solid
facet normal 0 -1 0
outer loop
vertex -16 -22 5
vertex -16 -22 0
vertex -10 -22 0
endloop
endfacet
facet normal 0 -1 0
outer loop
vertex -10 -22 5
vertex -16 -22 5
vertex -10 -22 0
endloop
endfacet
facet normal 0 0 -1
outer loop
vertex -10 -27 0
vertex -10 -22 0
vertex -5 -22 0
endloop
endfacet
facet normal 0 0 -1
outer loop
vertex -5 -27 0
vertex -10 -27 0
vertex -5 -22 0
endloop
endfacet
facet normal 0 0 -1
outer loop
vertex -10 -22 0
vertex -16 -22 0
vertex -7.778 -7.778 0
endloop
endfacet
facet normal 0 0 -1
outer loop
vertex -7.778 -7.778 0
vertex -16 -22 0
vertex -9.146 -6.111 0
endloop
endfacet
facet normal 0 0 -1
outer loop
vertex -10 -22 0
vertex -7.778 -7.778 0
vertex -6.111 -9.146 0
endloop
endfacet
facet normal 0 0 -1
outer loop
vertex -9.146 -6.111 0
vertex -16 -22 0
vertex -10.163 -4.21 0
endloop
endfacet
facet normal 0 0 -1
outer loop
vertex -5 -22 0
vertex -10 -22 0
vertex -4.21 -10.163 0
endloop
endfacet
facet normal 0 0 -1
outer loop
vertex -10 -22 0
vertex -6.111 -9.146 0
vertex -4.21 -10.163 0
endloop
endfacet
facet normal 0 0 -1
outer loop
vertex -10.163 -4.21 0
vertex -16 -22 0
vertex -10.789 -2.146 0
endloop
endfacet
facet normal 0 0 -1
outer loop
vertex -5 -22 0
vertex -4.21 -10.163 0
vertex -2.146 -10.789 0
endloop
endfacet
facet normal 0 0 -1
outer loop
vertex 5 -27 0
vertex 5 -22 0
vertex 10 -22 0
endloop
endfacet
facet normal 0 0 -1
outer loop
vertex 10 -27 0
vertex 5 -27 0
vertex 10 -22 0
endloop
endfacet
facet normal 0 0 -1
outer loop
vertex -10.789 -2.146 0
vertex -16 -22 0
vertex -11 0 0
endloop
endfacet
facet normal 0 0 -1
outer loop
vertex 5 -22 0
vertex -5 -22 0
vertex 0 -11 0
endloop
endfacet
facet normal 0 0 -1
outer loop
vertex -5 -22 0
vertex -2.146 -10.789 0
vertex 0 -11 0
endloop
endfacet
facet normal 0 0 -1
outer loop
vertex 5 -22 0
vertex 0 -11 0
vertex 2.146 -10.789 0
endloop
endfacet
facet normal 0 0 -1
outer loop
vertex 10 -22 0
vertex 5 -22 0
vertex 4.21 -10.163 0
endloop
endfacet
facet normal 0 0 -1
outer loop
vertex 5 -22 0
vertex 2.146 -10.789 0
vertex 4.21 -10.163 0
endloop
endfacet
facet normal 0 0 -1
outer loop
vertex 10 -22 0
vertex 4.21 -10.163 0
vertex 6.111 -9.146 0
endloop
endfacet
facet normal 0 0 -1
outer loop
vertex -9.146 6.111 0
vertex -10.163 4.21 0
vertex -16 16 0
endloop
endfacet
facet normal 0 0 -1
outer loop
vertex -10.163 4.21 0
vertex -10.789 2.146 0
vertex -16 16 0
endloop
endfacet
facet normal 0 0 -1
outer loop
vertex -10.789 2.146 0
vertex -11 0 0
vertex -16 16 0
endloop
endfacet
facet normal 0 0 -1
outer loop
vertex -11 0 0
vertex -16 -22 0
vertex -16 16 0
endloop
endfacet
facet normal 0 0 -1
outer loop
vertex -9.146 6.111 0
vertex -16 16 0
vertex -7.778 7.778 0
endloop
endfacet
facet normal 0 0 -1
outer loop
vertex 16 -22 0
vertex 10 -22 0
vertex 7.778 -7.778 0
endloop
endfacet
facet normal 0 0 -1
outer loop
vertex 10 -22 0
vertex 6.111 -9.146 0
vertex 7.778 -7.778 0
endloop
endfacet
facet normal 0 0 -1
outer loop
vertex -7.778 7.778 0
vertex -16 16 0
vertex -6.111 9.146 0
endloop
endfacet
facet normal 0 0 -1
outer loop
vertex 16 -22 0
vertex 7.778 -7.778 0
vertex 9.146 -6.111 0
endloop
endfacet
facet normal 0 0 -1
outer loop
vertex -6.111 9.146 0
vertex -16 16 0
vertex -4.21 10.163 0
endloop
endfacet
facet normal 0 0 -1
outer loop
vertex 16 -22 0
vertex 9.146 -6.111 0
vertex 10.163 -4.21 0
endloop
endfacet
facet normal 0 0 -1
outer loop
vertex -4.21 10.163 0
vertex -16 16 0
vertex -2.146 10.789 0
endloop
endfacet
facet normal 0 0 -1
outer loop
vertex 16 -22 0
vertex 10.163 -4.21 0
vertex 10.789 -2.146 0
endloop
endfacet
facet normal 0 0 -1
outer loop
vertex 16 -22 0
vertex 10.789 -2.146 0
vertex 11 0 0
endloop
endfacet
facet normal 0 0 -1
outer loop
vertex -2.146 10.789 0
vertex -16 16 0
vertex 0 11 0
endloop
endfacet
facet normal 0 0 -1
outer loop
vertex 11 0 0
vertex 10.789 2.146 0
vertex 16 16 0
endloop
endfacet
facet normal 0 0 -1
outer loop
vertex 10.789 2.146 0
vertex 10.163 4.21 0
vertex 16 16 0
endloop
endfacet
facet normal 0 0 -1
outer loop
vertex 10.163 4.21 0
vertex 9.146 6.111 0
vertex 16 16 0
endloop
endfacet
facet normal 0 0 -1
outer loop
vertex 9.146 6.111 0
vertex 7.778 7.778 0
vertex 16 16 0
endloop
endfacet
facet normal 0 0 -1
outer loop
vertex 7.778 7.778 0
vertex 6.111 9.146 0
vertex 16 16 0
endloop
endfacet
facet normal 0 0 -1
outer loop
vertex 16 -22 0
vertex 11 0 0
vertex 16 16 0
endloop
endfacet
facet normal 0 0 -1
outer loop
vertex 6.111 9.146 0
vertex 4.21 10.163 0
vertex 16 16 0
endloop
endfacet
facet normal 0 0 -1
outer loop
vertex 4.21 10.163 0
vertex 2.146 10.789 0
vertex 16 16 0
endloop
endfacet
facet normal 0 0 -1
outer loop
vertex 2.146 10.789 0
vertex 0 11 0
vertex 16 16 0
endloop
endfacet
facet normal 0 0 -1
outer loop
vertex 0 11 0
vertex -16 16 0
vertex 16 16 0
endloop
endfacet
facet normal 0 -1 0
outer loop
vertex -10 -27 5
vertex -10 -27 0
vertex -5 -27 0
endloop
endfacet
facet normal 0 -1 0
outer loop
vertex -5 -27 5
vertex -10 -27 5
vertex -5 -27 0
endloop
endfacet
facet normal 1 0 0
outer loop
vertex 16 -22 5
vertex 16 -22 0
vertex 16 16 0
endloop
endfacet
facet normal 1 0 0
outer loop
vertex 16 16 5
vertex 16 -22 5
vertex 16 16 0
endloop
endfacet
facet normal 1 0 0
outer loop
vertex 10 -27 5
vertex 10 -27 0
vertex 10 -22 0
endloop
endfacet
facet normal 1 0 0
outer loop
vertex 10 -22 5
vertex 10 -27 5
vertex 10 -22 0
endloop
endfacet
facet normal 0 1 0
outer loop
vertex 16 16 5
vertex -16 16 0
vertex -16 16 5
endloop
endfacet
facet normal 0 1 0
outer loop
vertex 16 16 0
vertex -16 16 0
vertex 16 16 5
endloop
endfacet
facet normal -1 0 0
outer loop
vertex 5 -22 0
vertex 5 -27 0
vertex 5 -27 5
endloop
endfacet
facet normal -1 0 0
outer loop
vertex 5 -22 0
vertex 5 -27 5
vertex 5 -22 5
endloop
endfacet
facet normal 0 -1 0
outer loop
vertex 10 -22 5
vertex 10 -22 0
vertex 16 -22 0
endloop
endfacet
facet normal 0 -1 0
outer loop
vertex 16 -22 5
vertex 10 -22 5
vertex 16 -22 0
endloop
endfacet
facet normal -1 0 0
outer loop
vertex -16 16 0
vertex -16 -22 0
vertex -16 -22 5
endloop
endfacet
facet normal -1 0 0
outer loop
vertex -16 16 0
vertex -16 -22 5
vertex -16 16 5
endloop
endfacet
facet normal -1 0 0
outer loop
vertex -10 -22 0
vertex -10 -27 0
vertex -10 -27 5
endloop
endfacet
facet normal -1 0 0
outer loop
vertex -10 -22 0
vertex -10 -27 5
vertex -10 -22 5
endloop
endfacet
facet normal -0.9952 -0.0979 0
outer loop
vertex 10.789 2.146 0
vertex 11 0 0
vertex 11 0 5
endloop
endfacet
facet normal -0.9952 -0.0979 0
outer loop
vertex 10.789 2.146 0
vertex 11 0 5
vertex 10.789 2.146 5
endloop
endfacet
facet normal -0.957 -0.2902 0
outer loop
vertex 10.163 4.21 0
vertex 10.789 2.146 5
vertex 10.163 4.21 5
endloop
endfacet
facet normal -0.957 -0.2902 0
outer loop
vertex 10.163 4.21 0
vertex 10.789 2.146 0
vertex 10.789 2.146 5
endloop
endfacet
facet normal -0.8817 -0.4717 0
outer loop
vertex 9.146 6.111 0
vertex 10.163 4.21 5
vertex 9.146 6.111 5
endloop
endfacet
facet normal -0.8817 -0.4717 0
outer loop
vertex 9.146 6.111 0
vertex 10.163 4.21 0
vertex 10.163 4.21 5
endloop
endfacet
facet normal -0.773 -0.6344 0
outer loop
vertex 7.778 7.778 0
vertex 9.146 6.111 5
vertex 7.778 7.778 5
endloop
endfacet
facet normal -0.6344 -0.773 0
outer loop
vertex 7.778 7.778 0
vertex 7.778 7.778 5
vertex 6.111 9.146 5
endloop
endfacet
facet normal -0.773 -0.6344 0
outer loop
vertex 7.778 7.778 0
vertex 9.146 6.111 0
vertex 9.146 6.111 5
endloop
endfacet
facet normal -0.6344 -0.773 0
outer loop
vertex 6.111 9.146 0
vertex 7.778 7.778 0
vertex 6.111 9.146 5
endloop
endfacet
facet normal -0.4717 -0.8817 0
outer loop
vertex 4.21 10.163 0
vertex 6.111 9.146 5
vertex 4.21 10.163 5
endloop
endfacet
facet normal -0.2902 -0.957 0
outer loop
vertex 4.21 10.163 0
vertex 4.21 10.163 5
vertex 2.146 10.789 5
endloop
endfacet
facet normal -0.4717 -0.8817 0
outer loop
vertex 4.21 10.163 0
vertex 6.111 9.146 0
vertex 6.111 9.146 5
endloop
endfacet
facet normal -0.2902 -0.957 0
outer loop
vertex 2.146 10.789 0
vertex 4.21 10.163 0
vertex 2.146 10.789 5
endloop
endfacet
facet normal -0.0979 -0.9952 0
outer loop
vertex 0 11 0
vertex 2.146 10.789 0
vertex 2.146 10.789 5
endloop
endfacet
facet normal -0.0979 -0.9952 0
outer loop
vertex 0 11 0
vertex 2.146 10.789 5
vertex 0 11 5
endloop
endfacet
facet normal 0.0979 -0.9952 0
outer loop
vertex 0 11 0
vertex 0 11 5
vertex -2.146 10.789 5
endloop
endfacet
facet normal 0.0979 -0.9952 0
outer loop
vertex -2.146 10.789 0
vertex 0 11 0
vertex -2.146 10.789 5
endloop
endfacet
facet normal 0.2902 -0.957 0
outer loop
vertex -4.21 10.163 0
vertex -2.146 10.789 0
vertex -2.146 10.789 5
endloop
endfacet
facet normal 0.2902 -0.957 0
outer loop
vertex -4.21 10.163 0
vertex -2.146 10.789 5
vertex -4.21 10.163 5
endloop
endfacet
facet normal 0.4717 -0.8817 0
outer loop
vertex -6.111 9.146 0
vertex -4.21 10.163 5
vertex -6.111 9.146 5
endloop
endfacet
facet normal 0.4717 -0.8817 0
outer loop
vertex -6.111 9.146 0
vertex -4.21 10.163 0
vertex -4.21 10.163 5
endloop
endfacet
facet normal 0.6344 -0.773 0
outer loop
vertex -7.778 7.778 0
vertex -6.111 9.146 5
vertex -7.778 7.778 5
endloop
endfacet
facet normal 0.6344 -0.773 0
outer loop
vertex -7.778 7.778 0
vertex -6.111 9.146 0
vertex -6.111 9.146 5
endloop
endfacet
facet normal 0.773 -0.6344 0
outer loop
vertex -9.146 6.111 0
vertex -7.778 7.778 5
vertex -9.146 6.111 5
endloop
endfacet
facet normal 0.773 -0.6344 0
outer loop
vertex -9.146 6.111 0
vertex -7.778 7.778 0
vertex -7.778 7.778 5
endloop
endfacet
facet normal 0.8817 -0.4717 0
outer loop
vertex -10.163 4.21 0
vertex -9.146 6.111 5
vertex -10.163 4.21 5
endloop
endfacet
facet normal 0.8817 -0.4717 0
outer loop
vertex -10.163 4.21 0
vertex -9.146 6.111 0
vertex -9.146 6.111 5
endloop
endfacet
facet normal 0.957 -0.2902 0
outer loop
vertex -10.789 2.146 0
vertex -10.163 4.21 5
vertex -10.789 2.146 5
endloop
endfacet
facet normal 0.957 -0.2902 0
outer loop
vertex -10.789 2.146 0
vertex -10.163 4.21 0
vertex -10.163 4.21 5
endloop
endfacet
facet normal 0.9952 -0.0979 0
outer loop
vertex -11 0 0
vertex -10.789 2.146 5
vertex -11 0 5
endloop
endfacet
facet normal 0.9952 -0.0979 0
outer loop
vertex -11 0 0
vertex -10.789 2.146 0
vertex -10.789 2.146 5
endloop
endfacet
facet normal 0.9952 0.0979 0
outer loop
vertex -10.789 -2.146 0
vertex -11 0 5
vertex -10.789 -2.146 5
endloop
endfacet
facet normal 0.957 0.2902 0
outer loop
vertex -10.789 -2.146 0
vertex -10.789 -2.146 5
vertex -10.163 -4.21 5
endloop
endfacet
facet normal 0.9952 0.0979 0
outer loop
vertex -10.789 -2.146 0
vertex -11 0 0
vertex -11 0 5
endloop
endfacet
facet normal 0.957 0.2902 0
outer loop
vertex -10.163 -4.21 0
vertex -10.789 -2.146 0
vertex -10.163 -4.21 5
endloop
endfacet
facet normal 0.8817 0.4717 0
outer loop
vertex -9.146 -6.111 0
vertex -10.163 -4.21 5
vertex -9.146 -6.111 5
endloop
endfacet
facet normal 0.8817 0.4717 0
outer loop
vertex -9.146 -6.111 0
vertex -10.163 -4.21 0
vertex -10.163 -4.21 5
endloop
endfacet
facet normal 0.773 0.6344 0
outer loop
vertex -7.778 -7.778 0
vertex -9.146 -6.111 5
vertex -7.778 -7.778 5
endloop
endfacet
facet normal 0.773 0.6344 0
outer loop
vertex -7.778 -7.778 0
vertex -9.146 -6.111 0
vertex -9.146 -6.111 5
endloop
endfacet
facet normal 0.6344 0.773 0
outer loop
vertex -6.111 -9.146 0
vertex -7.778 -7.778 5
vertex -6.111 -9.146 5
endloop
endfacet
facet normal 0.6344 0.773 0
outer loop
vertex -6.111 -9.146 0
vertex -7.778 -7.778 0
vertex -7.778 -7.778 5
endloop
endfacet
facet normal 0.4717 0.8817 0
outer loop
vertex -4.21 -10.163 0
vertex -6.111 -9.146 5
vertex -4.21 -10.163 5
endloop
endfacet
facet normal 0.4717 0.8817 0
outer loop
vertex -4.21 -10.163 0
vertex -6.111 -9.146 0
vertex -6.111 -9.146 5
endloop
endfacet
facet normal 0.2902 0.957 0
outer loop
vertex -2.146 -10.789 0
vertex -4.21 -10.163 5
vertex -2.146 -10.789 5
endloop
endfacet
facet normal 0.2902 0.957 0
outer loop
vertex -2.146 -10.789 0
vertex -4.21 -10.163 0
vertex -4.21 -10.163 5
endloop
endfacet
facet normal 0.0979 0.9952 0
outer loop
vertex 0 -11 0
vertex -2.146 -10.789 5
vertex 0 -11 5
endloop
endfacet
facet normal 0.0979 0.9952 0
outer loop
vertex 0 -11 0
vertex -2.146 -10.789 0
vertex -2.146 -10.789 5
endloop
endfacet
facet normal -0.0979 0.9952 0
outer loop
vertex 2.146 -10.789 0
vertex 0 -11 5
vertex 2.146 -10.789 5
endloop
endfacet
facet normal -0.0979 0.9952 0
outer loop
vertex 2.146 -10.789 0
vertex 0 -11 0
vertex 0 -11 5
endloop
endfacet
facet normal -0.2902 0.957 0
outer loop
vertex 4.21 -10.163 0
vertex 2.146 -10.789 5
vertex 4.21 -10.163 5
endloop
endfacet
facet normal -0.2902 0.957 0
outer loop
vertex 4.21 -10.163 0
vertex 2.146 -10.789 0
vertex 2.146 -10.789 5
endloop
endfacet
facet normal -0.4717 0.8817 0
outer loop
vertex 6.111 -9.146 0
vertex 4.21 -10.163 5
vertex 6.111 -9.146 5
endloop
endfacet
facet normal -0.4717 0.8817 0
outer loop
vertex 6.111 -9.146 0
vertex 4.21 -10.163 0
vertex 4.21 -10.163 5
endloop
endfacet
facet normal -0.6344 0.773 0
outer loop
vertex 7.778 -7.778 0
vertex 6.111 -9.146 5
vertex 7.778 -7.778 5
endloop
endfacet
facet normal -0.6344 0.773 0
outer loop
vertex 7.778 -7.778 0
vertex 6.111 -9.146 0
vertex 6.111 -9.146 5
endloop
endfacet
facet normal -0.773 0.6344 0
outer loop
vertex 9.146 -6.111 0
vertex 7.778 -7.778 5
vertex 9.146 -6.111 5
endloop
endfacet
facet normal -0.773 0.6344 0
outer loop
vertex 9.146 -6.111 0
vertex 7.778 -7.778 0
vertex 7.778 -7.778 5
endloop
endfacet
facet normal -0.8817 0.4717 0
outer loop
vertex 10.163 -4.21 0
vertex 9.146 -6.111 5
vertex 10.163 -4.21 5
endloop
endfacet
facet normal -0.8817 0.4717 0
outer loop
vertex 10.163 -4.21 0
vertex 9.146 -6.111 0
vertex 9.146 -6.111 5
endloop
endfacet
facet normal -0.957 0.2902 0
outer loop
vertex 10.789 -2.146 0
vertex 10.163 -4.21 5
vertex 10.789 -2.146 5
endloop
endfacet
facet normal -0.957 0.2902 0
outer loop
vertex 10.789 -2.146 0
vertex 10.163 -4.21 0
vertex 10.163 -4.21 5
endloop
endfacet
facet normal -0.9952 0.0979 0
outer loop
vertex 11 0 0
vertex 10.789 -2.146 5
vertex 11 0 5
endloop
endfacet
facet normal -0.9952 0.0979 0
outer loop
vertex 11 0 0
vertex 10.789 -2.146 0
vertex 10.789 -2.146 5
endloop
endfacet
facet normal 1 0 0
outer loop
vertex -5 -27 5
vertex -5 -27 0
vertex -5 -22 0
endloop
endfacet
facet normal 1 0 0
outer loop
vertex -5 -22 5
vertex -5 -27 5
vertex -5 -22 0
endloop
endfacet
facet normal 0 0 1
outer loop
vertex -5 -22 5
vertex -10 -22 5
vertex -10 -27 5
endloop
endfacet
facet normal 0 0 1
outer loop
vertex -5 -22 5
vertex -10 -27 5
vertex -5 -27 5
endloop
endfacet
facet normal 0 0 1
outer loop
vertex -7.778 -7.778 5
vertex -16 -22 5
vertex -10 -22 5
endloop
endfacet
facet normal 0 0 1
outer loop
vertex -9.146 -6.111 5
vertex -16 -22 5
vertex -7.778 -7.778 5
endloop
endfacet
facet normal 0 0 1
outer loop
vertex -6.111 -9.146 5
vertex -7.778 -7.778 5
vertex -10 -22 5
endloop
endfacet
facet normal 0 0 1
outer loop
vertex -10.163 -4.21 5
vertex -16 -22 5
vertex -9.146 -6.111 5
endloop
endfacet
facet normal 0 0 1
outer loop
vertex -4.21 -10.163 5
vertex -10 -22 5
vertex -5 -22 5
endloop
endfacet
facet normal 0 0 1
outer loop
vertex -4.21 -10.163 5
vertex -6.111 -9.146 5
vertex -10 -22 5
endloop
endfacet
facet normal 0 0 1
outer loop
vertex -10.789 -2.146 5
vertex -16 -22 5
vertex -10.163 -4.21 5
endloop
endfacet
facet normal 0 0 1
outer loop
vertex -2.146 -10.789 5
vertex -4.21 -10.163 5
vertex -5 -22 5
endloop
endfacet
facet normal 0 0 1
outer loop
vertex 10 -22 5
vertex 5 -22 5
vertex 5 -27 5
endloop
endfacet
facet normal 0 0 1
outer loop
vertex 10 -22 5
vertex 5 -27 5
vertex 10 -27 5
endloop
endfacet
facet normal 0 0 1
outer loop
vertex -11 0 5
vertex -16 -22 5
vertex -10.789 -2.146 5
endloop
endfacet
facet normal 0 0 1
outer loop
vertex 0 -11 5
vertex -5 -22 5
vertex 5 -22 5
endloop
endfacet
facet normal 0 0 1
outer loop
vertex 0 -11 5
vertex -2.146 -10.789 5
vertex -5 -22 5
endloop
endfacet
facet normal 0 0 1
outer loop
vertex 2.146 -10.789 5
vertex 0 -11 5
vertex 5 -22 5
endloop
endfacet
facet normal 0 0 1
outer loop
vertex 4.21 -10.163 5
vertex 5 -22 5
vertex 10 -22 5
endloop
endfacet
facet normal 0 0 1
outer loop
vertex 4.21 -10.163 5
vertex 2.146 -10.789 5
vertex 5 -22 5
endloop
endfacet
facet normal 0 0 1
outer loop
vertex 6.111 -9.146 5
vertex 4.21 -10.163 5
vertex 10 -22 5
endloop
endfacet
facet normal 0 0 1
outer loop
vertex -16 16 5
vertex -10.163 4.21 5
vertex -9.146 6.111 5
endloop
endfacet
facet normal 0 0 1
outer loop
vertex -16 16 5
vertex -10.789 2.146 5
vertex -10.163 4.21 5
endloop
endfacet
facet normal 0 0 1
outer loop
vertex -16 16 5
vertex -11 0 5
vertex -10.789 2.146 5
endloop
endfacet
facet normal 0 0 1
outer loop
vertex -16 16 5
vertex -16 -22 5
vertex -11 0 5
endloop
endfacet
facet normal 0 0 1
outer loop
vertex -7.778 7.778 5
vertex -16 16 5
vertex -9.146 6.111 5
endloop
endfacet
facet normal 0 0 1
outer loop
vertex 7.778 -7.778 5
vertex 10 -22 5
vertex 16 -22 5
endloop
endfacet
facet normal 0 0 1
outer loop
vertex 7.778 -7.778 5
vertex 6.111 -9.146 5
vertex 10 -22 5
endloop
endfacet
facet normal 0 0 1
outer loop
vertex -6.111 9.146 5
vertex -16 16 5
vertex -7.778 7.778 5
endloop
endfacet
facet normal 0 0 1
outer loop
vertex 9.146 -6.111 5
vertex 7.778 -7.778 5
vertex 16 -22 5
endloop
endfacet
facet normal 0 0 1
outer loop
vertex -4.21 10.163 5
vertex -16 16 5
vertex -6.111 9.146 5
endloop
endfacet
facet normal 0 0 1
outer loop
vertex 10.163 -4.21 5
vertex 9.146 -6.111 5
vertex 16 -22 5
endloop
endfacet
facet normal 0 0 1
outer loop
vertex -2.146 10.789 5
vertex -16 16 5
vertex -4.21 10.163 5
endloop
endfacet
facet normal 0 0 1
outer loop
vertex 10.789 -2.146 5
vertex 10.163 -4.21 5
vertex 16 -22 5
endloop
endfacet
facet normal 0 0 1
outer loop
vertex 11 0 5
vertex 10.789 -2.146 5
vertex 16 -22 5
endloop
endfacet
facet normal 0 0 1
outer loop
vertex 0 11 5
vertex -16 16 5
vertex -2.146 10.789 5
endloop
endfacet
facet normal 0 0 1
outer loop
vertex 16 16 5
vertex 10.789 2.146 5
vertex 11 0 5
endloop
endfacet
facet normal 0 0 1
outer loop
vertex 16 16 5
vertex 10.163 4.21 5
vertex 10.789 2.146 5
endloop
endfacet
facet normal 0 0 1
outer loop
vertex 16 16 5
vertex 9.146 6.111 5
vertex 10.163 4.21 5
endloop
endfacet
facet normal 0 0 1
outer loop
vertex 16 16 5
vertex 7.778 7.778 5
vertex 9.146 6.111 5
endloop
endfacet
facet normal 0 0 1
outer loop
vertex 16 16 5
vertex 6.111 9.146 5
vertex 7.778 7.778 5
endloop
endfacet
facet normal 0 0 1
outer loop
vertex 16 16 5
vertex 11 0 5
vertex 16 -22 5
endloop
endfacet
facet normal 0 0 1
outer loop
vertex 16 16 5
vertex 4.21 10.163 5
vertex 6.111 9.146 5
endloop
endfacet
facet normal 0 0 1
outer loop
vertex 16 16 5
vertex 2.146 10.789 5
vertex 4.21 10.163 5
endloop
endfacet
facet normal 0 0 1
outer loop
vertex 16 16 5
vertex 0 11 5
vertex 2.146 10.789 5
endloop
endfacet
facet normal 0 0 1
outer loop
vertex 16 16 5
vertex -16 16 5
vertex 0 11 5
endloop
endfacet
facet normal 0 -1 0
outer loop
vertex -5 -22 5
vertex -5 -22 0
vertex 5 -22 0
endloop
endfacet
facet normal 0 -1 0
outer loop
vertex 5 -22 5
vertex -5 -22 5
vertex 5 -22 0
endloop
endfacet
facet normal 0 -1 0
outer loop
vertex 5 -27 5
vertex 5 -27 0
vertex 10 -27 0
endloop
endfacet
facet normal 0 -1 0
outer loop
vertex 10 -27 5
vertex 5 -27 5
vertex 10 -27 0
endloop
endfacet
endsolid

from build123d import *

# Parameters (mm, degrees)
SKETCH1_W           = 5
SKETCH1_H           = 5
SKETCH1_W_2         = 32
SKETCH1_H_2         = 38
SKETCH1_R           = 11
BOSS_EXTRUDE1_DEPTH = 5


with BuildPart() as part:
    # Sketch1 → Boss-Extrude1 (new body)
    # profile 1 of 3: a face of its own
    with BuildSketch(Plane.XY):
        with Locations((7.5, -24.5)):
            Rectangle(SKETCH1_W, SKETCH1_H)
    # profile 2 of 3: a face of its own
    with BuildSketch(Plane.XY):
        with Locations((-7.5, -24.5)):
            Rectangle(SKETCH1_W, SKETCH1_H)
    # profile 3 of 3: a face of its own
    with BuildSketch(Plane.XY):
        with Locations((0, -3)):
            Rectangle(SKETCH1_W_2, SKETCH1_H_2)
        Circle(SKETCH1_R, mode=Mode.SUBTRACT)
    extrude(amount=BOSS_EXTRUDE1_DEPTH)


solid = part.part
